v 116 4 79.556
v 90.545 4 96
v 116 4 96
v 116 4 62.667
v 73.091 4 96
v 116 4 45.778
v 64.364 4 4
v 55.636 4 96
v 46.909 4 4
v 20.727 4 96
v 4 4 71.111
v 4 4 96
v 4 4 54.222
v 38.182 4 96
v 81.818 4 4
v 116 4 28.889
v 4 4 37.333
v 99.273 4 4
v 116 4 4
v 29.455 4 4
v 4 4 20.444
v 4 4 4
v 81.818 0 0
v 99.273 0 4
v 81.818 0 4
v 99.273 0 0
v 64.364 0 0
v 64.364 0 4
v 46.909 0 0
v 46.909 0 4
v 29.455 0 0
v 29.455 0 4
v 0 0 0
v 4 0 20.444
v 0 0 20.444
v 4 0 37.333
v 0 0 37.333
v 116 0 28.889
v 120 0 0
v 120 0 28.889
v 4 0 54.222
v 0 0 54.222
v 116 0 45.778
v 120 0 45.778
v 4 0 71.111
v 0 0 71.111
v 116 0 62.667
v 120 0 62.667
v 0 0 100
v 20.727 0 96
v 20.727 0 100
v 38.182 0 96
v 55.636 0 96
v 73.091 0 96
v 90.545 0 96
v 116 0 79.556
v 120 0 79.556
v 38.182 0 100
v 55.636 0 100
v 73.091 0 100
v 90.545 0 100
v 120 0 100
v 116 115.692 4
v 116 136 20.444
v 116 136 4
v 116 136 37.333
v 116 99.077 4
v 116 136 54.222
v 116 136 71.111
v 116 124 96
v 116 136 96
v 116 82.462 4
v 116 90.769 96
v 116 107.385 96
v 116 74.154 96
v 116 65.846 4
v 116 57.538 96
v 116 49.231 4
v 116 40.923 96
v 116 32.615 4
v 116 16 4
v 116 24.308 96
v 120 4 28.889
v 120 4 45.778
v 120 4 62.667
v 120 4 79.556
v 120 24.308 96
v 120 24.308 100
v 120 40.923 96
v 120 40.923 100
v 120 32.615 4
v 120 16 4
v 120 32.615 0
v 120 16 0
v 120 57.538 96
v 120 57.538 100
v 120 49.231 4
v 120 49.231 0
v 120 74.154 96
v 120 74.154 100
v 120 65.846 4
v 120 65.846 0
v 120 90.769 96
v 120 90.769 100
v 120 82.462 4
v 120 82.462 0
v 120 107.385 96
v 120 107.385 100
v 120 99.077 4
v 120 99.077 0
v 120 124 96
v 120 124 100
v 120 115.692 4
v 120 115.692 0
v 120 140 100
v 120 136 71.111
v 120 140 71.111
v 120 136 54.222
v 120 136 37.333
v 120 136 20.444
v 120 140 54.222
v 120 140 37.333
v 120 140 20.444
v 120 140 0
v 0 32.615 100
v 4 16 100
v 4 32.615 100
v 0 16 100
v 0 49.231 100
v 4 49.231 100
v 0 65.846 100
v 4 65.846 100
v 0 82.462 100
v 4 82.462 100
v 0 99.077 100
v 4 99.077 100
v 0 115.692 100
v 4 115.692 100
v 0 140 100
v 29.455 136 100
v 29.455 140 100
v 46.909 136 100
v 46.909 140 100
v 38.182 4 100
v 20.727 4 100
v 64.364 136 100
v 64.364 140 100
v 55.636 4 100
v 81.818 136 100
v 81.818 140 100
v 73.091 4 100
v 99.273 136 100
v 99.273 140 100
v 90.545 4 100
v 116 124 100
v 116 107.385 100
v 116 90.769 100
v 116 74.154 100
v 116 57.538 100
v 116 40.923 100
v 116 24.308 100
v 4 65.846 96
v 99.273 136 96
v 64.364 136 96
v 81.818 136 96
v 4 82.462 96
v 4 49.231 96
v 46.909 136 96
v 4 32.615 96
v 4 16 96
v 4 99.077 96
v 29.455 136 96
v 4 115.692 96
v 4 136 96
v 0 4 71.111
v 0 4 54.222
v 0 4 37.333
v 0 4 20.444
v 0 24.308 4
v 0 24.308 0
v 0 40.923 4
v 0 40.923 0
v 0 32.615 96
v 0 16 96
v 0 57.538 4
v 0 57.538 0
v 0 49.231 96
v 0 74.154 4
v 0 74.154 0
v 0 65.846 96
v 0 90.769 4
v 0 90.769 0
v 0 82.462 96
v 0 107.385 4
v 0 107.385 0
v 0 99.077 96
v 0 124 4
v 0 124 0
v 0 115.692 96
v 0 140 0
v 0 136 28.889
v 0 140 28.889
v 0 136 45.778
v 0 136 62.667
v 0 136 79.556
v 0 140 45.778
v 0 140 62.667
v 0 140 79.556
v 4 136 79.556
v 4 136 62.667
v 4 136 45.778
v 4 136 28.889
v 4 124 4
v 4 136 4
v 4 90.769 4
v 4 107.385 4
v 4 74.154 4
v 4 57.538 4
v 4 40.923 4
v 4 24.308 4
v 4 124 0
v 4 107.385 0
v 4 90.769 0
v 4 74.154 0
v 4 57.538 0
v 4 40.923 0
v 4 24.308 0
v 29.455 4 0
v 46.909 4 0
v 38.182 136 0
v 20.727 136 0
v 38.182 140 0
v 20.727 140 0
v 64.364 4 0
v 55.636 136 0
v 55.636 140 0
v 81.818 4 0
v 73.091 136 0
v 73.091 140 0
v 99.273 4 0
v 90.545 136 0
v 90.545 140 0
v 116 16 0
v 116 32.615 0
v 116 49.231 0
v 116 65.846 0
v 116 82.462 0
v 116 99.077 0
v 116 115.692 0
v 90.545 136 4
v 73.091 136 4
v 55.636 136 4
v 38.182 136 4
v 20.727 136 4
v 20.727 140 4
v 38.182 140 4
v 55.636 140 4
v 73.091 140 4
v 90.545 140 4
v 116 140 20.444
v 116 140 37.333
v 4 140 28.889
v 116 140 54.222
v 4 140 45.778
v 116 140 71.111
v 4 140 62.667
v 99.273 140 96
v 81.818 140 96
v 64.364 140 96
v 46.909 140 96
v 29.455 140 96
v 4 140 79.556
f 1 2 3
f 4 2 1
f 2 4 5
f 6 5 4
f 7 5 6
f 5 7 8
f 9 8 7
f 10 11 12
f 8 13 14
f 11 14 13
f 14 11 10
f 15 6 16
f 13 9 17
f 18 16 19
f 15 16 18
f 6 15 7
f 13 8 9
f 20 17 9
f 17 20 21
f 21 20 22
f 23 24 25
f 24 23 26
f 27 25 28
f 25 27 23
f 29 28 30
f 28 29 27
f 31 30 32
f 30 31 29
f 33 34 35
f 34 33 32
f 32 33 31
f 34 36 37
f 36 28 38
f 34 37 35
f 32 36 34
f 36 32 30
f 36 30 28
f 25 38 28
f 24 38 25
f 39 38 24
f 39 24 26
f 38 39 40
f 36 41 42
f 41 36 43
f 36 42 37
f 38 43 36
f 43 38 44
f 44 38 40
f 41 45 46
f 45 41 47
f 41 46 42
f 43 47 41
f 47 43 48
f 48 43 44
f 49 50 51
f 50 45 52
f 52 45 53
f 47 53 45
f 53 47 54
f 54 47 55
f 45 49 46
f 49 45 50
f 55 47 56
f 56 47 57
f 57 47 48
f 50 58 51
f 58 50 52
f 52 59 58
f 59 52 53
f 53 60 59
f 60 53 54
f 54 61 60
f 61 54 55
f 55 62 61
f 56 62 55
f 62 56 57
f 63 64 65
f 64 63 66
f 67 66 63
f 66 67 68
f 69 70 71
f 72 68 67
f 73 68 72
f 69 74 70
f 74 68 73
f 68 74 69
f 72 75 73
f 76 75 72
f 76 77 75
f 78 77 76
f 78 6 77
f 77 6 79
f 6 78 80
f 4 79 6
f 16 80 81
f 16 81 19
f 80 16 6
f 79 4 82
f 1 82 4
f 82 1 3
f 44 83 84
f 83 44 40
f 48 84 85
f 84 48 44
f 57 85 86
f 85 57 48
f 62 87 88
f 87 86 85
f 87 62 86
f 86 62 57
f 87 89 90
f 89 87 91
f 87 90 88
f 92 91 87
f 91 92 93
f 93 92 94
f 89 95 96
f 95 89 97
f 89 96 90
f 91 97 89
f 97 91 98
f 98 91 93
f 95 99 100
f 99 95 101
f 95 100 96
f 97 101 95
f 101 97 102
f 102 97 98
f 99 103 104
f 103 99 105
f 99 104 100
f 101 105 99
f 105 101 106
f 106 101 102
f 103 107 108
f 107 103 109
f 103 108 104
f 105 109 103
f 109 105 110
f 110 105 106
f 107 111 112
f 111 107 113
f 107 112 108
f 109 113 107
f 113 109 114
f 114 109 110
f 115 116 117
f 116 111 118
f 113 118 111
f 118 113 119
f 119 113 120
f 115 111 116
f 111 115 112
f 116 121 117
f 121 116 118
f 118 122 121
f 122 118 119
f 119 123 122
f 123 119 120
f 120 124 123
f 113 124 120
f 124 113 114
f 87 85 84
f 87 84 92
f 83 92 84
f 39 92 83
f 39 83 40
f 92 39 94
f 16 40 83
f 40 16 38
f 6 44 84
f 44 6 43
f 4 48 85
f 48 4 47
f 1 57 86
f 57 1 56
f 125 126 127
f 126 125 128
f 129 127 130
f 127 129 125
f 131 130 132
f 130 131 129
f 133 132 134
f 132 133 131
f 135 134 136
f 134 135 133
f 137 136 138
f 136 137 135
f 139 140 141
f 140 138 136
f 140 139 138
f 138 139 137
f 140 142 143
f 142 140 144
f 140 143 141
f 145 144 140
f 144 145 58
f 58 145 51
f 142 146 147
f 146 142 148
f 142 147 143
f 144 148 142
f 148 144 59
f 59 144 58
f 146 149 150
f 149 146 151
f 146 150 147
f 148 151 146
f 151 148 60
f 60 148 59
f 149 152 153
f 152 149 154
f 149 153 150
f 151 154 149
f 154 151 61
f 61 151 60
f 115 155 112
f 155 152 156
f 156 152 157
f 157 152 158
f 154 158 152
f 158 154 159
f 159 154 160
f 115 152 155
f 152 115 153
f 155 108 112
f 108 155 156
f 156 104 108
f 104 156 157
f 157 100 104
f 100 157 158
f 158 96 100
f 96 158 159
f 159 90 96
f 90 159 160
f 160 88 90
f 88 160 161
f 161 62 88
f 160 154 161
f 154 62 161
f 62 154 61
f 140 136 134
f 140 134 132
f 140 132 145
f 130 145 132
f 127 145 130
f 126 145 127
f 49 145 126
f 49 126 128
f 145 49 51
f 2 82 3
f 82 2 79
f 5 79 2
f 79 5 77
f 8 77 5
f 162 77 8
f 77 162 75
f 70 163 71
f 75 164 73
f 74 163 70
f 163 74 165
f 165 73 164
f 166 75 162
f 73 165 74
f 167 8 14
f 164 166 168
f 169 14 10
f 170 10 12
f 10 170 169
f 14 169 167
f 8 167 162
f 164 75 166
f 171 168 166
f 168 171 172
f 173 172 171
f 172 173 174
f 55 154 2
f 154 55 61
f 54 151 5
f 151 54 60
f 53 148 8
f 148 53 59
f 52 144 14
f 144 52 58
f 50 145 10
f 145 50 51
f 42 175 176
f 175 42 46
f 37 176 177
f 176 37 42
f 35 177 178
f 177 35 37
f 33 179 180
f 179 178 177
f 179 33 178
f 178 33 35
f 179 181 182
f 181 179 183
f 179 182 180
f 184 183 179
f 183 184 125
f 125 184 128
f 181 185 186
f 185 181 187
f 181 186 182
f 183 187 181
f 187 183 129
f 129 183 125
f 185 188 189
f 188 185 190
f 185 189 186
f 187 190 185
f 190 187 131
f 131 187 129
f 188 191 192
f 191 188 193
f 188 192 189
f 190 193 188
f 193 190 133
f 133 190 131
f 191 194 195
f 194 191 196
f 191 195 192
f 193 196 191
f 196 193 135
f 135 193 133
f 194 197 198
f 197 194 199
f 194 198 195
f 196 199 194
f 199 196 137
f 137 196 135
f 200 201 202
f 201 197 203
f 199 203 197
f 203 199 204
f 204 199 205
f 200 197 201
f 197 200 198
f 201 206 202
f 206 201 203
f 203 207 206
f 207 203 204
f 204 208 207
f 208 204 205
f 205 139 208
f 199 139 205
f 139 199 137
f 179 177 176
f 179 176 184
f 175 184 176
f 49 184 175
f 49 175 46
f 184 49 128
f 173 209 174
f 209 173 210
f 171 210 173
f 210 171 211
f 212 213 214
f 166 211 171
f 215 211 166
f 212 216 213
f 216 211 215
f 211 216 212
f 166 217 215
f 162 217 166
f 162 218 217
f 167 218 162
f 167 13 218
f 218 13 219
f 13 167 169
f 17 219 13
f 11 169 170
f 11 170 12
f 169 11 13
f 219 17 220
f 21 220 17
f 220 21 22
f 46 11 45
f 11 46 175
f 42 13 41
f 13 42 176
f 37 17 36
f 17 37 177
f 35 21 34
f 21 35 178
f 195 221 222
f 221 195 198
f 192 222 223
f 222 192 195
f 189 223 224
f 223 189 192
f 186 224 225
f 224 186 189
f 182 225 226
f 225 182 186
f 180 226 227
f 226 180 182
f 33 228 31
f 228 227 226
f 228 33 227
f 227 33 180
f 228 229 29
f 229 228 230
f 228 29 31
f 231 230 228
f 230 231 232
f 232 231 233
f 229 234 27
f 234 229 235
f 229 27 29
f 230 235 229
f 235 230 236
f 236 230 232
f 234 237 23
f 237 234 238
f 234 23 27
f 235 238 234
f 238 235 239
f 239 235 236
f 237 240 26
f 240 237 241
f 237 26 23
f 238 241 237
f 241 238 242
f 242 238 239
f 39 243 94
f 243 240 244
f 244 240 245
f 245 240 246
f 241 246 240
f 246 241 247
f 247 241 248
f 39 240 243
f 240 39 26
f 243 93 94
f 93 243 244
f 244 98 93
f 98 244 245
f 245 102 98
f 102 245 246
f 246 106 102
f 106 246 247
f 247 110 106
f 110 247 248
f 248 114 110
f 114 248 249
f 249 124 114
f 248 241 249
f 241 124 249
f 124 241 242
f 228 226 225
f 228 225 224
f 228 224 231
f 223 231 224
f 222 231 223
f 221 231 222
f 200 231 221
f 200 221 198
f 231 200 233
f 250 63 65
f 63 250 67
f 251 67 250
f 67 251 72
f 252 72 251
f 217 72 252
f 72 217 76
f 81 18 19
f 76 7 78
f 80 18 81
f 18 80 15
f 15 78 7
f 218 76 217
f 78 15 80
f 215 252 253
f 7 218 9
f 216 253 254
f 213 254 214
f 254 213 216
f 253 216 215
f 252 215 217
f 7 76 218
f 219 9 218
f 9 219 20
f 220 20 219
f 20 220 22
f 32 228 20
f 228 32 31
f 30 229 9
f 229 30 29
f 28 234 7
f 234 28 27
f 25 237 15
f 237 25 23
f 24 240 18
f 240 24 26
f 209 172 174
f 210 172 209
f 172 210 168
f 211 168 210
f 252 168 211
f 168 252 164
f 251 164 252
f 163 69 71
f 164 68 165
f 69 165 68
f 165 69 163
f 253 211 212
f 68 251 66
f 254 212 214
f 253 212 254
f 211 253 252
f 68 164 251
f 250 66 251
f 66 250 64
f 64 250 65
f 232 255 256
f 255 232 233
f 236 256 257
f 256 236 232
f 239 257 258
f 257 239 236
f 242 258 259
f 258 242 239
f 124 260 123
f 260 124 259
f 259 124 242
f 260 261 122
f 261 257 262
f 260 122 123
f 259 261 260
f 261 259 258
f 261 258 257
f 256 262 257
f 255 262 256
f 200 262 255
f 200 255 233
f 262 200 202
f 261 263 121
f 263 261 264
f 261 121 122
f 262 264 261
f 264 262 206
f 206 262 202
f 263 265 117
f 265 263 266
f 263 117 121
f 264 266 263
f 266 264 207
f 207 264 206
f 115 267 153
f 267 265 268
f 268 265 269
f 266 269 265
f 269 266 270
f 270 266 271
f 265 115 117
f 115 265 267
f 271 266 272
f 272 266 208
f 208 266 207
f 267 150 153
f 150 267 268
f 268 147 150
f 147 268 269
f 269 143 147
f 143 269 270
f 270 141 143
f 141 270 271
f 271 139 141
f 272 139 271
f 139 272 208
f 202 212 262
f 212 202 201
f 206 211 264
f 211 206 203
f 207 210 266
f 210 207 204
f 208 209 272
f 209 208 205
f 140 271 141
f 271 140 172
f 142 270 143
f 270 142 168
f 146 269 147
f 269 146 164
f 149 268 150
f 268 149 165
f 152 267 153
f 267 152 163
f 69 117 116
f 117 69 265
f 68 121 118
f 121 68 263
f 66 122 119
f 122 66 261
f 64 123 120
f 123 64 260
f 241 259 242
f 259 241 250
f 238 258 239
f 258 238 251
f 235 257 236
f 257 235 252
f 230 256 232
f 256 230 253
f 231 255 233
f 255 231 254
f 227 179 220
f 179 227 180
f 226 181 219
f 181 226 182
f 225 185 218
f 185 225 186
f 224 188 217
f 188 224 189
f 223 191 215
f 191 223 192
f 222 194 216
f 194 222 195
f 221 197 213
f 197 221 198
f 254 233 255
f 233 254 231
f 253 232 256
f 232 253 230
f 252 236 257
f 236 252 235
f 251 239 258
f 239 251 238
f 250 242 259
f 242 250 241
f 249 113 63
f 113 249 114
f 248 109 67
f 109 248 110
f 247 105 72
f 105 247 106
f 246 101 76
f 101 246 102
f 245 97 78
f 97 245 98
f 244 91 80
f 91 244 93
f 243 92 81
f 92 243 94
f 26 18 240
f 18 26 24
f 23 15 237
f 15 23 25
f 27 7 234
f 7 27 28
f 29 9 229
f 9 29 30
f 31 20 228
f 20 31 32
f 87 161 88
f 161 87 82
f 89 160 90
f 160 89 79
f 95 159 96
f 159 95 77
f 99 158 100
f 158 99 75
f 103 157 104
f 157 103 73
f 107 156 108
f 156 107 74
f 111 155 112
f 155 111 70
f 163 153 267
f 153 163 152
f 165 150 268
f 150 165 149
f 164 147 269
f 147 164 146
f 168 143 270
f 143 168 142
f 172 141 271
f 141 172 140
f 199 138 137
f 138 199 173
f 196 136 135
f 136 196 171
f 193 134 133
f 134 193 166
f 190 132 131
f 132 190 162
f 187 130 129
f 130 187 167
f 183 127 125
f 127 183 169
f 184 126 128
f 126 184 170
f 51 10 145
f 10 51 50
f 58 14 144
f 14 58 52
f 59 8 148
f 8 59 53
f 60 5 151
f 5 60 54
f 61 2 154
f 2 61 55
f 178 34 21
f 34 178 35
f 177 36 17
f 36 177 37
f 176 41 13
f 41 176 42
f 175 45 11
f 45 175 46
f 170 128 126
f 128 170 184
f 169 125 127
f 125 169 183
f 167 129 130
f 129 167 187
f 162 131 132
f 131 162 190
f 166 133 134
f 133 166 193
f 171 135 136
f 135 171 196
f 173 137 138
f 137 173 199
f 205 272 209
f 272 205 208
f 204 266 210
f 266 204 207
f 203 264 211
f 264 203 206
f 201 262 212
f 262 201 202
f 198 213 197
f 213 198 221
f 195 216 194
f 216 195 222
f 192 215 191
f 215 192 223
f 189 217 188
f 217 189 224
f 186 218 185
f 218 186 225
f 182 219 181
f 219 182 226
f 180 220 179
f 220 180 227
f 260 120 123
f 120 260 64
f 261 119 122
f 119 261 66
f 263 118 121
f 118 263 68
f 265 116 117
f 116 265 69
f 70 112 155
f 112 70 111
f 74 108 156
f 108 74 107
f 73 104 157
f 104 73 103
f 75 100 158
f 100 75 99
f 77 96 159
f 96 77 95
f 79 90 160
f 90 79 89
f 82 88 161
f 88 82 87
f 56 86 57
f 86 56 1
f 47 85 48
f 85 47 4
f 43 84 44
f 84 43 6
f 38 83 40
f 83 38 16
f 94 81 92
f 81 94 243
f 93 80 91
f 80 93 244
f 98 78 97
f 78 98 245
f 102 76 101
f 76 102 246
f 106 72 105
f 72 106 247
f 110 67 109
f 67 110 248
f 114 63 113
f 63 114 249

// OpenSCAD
include <box.scad>
box(width = 120, height = 100, depth = 140, thickness = 4, assemble = true, labels = true);
